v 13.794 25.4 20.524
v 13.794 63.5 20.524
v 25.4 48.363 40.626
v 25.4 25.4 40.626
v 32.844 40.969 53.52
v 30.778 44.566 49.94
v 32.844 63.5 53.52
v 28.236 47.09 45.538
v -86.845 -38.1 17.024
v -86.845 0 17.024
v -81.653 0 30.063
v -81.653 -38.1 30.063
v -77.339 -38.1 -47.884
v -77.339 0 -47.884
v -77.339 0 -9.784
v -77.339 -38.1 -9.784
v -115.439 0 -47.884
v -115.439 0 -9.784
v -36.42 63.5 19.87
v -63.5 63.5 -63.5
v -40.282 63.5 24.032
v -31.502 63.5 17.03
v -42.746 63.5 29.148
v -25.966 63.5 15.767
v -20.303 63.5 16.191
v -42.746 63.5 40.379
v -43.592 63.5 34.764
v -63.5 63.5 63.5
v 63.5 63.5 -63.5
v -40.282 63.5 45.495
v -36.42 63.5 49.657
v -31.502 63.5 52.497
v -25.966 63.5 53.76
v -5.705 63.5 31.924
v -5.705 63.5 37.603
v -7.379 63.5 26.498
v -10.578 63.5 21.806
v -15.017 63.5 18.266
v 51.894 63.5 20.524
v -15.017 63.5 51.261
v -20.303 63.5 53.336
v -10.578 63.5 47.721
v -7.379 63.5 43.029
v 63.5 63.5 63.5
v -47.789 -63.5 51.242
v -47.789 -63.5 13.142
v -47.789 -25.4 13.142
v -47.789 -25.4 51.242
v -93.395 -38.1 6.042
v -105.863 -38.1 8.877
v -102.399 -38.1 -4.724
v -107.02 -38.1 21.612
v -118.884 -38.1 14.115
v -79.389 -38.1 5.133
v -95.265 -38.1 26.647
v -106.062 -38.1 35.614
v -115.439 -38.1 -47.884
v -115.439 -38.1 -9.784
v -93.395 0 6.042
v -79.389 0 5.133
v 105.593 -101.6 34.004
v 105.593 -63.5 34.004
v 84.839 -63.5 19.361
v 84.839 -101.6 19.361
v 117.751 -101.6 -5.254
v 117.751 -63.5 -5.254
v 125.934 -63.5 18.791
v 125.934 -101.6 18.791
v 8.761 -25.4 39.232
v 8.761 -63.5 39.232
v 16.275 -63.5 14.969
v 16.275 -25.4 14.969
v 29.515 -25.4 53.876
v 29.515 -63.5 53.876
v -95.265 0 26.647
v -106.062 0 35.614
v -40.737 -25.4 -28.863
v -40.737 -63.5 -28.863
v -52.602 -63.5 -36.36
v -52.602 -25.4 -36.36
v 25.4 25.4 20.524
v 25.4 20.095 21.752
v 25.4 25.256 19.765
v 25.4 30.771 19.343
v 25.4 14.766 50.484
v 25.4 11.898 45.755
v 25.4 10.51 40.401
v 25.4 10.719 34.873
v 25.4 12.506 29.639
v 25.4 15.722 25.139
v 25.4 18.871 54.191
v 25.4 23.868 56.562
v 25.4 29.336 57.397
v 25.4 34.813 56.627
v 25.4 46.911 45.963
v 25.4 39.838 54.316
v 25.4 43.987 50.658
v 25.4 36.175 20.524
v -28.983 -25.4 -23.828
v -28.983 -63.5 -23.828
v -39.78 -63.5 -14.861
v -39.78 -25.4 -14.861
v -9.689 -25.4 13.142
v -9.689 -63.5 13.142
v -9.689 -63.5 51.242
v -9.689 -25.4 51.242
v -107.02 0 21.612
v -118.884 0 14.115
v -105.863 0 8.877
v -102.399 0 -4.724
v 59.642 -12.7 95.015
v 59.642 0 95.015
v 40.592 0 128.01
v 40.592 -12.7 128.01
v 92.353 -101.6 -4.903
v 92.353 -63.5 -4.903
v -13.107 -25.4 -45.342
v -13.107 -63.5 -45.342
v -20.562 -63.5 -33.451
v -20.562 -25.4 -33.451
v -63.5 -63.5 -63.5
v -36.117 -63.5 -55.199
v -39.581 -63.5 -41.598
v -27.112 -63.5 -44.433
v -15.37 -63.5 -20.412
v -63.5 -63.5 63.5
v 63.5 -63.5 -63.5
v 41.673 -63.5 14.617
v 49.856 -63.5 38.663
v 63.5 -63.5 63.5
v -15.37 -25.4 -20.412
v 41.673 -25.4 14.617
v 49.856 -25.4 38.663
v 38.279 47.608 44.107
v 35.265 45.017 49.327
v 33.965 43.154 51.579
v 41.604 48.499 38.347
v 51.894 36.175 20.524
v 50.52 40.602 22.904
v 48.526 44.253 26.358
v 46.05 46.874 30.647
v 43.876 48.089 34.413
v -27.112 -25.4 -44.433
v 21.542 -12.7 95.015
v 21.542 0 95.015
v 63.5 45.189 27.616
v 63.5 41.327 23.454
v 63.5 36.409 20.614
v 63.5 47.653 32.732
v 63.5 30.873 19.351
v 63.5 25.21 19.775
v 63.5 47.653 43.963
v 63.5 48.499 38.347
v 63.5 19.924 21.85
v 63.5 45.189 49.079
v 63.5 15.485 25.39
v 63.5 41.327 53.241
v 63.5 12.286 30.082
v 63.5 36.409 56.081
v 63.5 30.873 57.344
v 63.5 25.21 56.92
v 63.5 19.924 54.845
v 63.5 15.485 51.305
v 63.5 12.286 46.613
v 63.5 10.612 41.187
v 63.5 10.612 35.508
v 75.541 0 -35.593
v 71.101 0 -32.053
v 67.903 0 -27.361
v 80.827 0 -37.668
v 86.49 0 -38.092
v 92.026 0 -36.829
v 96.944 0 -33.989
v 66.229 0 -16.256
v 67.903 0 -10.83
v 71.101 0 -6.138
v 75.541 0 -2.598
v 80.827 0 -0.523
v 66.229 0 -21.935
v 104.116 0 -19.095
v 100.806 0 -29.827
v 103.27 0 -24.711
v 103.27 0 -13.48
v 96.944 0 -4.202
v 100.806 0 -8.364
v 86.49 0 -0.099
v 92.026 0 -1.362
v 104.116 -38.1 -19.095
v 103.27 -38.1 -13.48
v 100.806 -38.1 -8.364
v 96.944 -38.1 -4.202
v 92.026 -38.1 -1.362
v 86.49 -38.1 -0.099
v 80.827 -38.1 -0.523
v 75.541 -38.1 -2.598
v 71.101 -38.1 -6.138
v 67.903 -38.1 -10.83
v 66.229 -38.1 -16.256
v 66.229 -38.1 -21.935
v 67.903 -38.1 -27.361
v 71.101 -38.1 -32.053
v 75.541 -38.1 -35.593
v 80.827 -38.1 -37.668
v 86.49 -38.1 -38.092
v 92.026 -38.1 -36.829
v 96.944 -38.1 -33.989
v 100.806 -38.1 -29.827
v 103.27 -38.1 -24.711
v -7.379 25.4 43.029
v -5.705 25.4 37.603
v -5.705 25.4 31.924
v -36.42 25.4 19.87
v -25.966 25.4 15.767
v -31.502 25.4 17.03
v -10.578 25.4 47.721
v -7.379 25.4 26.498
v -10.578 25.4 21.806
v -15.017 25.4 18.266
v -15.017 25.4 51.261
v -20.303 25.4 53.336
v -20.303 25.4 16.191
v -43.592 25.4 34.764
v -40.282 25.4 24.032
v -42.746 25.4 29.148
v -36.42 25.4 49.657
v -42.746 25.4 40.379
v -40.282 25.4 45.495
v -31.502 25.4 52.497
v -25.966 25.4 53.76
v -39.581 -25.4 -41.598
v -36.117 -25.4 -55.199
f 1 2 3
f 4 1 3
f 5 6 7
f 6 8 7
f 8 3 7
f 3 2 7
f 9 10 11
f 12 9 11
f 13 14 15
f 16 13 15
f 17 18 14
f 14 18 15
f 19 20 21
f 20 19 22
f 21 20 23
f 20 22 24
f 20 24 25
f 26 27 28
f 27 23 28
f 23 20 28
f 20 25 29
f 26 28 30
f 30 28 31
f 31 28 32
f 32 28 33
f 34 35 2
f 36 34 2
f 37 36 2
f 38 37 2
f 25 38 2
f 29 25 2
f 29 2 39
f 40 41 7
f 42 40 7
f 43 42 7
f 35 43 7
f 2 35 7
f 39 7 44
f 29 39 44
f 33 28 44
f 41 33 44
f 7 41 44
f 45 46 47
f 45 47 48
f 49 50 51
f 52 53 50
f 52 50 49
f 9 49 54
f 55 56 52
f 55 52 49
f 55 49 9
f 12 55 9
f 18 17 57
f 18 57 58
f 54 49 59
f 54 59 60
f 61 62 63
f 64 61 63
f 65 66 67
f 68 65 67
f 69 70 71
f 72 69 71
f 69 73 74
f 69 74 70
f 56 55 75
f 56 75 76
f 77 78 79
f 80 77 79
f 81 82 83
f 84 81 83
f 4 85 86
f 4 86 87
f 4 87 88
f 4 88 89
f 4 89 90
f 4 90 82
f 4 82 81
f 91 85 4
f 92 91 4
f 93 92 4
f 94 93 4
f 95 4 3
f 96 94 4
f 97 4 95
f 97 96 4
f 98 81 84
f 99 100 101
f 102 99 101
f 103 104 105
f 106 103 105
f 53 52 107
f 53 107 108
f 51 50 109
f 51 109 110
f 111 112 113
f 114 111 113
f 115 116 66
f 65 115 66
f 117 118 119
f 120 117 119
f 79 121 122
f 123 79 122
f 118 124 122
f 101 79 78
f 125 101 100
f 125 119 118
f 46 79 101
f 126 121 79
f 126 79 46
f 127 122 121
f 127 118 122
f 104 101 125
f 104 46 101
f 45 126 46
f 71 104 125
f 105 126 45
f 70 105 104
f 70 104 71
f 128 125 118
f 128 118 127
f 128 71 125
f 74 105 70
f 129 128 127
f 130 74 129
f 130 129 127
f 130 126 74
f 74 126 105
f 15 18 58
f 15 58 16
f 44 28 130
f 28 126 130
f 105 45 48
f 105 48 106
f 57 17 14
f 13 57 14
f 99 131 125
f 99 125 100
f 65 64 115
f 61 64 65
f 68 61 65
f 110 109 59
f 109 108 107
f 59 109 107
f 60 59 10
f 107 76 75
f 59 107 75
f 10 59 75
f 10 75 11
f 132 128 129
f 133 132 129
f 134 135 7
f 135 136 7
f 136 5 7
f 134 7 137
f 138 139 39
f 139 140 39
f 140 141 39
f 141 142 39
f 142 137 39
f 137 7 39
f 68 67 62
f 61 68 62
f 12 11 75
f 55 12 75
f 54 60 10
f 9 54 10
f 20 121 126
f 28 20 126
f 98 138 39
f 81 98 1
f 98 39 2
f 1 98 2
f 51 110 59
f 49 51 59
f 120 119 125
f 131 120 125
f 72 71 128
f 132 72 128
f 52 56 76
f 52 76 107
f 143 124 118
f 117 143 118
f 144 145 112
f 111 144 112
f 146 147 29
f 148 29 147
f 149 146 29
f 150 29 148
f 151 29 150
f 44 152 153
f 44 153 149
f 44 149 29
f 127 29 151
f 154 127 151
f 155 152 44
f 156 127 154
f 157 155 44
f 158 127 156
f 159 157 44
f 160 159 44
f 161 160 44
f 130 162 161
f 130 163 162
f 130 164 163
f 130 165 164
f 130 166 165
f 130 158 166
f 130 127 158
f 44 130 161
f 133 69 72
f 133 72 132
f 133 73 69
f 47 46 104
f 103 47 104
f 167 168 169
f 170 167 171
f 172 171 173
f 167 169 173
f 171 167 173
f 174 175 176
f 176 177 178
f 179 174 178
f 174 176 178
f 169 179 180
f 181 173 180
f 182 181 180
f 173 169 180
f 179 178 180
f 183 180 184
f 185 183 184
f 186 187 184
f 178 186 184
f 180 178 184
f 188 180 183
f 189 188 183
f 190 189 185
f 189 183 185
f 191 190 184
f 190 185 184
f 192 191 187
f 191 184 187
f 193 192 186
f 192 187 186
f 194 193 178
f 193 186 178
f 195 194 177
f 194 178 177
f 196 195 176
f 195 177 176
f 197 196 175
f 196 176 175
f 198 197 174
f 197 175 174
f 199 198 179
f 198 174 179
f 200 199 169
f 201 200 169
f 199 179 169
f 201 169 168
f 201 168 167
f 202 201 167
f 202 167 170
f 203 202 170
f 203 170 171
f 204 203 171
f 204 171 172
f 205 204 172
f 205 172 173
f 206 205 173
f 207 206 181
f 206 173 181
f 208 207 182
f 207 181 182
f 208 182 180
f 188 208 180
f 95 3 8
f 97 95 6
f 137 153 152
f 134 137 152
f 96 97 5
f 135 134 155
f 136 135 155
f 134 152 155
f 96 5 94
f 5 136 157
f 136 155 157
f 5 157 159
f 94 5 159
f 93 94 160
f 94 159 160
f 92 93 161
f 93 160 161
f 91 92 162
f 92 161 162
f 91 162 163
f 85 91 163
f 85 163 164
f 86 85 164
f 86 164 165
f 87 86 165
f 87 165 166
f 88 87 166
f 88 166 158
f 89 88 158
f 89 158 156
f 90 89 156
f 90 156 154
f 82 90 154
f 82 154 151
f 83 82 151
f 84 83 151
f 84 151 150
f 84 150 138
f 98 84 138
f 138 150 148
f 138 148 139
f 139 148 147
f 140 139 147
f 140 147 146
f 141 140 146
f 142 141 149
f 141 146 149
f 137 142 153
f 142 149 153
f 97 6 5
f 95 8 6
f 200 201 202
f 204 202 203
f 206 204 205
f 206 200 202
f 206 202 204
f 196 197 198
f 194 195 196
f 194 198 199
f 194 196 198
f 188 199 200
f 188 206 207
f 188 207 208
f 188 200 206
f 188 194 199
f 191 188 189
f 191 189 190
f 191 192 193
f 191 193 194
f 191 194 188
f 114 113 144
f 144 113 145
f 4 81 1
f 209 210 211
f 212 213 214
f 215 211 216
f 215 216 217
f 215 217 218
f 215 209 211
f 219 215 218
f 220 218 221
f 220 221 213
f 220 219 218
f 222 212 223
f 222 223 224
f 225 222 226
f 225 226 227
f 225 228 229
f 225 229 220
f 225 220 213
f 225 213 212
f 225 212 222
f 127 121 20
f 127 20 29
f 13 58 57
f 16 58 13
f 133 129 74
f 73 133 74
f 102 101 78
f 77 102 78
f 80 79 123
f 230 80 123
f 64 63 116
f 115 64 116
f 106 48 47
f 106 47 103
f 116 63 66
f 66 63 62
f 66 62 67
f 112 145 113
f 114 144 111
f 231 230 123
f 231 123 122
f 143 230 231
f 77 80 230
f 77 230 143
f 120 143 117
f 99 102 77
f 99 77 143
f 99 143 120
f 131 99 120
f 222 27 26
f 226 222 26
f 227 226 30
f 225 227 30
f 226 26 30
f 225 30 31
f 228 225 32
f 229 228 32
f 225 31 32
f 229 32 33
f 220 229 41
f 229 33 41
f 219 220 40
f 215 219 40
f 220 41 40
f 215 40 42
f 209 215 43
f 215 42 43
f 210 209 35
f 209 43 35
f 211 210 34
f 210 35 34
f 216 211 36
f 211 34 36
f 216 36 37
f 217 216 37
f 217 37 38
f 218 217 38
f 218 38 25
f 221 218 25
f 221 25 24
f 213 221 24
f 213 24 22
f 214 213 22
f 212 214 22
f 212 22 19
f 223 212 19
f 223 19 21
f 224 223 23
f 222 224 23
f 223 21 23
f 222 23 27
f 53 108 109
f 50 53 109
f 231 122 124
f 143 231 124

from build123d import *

# Parameters (mm, degrees)
F0_W      = 127
F0_H      = 127
F1_DEPTH  = 63.5
F2_W      = 38.1
F2_H      = 38.1
F3_DEPTH  = 38.1
F5_DEPTH  = 38.1
F7_DEPTH  = 38.1
F8_R      = 19.05
F9_DEPTH  = 38.1
F11_DEPTH = 38.1
F12_R     = 19.05
F13_DEPTH = 38.1
F15_DEPTH = 38.1
F16_W     = 38.1
F16_H     = 38.1
F17_DEPTH = 38.1
F18_R     = 19.05
F19_DEPTH = 38.1
F21_DEPTH = 38.1
F24_DEPTH = 12.7


# Not quite as in the source:
# - the program builds the solid bodies; features that only make, move or delete a surface that nothing else refers to are left out


with BuildPart() as f1:
    # F0 (on Front) → F1 (new body, symmetric)
    with BuildSketch(Plane.XZ):
        Rectangle(F0_W, F0_H)
    extrude(amount=F1_DEPTH, both=True)

    # F2 (on face) → F3 (cut)
    with BuildSketch(Plane.XZ.offset(63.5)):
        with Locations((-28.7386754062, 32.1922943337)):
            Rectangle(F2_W, F2_H)
        with Locations((86.2550362945, -6.9399550557)):
            Rectangle(F2_W, F2_H)
    extrude(amount=-F3_DEPTH, mode=Mode.SUBTRACT)

    # F4 (on face) → F5 (cut)
    with BuildSketch(Plane.XZ.offset(63.5)):
        Polygon((8.7614915837, 39.2321395601), (16.2751341757, 14.9688921476), (41.6726969844, 14.6170351066), (49.8556114396, 38.6628229086), (29.5153678912, 53.8757940975), align=None)
    extrude(amount=-F5_DEPTH, mode=Mode.SUBTRACT)

    # F6 (on face) → F7 (cut)
    with BuildSketch(Plane(origin=(0, 63.5, 0), x_dir=(-1, 0, 0), z_dir=(0, 1, 0))):
        Polygon((-51.8942007303, 20.5241581157), (-13.7942007303, 20.5241581157), (-32.8442007303, 53.5197259999), align=None)
    extrude(amount=-F7_DEPTH, mode=Mode.SUBTRACT)

    # F8 (on face) → F9 (cut)
    with BuildSketch(Plane(origin=(0, 63.5, 0), x_dir=(-1, 0, 0), z_dir=(0, 1, 0))):
        with Locations((24.542177096, 34.7635373473)):
            Circle(F8_R)
    extrude(amount=-F9_DEPTH, mode=Mode.SUBTRACT)

    # F10 (on face) → F11 (cut)
    with BuildSketch(Plane.XZ.offset(63.5)):
        Polygon((-39.7797108135, -14.8606818497), (-40.7370848933, -28.8630111208), (-52.6019230047, -36.3601710319), (-39.5807613688, -41.5976455947), (-36.1169751935, -55.1985270174), (-27.1120806497, -44.4331350413), (-13.1065049523, -45.3417821264), (-20.5623356949, -33.4509294202), (-15.3702000572, -20.4116227799), (-28.9830514143, -23.8280636283), align=None)
    extrude(amount=-F11_DEPTH, mode=Mode.SUBTRACT)

    # F12 (on face) → F13 (cut)
    with BuildSketch(Plane.YZ.offset(63.5)):
        with Locations((29.4494424015, 38.3474603295)):
            Circle(F12_R)
    extrude(amount=-F13_DEPTH, mode=Mode.SUBTRACT)


with BuildPart() as f15:
    # F14 (on face) → F15 (new body)
    with BuildSketch(Plane.XZ.offset(63.5)):
        Polygon((84.8394576032, 19.3606587971), (92.3531001952, -4.9025886154), (117.7506630039, -5.2544456563), (125.9335774591, 18.7913421457), (105.5933339107, 34.0043133345), align=None)
    extrude(amount=F15_DEPTH)


with BuildPart() as f17:
    # F16 (on Front) → F17 (new body)
    with BuildSketch(Plane.XZ):
        with Locations((-96.3894203305, -28.8341529667)):
            Rectangle(F16_W, F16_H)
    extrude(amount=F17_DEPTH)


with BuildPart() as f19:
    # F18 (on Front) → F19 (new body)
    with BuildSketch(Plane.XZ):
        with Locations((85.0661173463, -19.0954655409)):
            Circle(F18_R)
    extrude(amount=F19_DEPTH)


with BuildPart() as f21:
    # F20 (on Front) → F21 (new body)
    with BuildSketch(Plane.XZ):
        Polygon((-106.0621396145, 35.6140661657), (-107.0195136944, 21.6117368946), (-118.8843518057, 14.1145769835), (-105.8631901699, 8.8771024207), (-102.3994039946, -4.723779002), (-93.3945094508, 6.0416129741), (-79.3889337533, 5.132965889), (-86.844764496, 17.0238185952), (-81.6526288582, 30.0631252355), (-95.2654802154, 26.6466843871), align=None)
    extrude(amount=F21_DEPTH)


with BuildPart() as f24:
    # F22 (on Front) → F24 (new body)
    with BuildSketch(Plane.XZ):
        Polygon((21.5419738114, 95.014536988), (59.6419738114, 95.014536988), (40.5919738114, 128.0101048722), align=None)
    extrude(amount=F24_DEPTH)


solid = Compound([f1.part, f15.part, f17.part, f19.part, f21.part, f24.part])
